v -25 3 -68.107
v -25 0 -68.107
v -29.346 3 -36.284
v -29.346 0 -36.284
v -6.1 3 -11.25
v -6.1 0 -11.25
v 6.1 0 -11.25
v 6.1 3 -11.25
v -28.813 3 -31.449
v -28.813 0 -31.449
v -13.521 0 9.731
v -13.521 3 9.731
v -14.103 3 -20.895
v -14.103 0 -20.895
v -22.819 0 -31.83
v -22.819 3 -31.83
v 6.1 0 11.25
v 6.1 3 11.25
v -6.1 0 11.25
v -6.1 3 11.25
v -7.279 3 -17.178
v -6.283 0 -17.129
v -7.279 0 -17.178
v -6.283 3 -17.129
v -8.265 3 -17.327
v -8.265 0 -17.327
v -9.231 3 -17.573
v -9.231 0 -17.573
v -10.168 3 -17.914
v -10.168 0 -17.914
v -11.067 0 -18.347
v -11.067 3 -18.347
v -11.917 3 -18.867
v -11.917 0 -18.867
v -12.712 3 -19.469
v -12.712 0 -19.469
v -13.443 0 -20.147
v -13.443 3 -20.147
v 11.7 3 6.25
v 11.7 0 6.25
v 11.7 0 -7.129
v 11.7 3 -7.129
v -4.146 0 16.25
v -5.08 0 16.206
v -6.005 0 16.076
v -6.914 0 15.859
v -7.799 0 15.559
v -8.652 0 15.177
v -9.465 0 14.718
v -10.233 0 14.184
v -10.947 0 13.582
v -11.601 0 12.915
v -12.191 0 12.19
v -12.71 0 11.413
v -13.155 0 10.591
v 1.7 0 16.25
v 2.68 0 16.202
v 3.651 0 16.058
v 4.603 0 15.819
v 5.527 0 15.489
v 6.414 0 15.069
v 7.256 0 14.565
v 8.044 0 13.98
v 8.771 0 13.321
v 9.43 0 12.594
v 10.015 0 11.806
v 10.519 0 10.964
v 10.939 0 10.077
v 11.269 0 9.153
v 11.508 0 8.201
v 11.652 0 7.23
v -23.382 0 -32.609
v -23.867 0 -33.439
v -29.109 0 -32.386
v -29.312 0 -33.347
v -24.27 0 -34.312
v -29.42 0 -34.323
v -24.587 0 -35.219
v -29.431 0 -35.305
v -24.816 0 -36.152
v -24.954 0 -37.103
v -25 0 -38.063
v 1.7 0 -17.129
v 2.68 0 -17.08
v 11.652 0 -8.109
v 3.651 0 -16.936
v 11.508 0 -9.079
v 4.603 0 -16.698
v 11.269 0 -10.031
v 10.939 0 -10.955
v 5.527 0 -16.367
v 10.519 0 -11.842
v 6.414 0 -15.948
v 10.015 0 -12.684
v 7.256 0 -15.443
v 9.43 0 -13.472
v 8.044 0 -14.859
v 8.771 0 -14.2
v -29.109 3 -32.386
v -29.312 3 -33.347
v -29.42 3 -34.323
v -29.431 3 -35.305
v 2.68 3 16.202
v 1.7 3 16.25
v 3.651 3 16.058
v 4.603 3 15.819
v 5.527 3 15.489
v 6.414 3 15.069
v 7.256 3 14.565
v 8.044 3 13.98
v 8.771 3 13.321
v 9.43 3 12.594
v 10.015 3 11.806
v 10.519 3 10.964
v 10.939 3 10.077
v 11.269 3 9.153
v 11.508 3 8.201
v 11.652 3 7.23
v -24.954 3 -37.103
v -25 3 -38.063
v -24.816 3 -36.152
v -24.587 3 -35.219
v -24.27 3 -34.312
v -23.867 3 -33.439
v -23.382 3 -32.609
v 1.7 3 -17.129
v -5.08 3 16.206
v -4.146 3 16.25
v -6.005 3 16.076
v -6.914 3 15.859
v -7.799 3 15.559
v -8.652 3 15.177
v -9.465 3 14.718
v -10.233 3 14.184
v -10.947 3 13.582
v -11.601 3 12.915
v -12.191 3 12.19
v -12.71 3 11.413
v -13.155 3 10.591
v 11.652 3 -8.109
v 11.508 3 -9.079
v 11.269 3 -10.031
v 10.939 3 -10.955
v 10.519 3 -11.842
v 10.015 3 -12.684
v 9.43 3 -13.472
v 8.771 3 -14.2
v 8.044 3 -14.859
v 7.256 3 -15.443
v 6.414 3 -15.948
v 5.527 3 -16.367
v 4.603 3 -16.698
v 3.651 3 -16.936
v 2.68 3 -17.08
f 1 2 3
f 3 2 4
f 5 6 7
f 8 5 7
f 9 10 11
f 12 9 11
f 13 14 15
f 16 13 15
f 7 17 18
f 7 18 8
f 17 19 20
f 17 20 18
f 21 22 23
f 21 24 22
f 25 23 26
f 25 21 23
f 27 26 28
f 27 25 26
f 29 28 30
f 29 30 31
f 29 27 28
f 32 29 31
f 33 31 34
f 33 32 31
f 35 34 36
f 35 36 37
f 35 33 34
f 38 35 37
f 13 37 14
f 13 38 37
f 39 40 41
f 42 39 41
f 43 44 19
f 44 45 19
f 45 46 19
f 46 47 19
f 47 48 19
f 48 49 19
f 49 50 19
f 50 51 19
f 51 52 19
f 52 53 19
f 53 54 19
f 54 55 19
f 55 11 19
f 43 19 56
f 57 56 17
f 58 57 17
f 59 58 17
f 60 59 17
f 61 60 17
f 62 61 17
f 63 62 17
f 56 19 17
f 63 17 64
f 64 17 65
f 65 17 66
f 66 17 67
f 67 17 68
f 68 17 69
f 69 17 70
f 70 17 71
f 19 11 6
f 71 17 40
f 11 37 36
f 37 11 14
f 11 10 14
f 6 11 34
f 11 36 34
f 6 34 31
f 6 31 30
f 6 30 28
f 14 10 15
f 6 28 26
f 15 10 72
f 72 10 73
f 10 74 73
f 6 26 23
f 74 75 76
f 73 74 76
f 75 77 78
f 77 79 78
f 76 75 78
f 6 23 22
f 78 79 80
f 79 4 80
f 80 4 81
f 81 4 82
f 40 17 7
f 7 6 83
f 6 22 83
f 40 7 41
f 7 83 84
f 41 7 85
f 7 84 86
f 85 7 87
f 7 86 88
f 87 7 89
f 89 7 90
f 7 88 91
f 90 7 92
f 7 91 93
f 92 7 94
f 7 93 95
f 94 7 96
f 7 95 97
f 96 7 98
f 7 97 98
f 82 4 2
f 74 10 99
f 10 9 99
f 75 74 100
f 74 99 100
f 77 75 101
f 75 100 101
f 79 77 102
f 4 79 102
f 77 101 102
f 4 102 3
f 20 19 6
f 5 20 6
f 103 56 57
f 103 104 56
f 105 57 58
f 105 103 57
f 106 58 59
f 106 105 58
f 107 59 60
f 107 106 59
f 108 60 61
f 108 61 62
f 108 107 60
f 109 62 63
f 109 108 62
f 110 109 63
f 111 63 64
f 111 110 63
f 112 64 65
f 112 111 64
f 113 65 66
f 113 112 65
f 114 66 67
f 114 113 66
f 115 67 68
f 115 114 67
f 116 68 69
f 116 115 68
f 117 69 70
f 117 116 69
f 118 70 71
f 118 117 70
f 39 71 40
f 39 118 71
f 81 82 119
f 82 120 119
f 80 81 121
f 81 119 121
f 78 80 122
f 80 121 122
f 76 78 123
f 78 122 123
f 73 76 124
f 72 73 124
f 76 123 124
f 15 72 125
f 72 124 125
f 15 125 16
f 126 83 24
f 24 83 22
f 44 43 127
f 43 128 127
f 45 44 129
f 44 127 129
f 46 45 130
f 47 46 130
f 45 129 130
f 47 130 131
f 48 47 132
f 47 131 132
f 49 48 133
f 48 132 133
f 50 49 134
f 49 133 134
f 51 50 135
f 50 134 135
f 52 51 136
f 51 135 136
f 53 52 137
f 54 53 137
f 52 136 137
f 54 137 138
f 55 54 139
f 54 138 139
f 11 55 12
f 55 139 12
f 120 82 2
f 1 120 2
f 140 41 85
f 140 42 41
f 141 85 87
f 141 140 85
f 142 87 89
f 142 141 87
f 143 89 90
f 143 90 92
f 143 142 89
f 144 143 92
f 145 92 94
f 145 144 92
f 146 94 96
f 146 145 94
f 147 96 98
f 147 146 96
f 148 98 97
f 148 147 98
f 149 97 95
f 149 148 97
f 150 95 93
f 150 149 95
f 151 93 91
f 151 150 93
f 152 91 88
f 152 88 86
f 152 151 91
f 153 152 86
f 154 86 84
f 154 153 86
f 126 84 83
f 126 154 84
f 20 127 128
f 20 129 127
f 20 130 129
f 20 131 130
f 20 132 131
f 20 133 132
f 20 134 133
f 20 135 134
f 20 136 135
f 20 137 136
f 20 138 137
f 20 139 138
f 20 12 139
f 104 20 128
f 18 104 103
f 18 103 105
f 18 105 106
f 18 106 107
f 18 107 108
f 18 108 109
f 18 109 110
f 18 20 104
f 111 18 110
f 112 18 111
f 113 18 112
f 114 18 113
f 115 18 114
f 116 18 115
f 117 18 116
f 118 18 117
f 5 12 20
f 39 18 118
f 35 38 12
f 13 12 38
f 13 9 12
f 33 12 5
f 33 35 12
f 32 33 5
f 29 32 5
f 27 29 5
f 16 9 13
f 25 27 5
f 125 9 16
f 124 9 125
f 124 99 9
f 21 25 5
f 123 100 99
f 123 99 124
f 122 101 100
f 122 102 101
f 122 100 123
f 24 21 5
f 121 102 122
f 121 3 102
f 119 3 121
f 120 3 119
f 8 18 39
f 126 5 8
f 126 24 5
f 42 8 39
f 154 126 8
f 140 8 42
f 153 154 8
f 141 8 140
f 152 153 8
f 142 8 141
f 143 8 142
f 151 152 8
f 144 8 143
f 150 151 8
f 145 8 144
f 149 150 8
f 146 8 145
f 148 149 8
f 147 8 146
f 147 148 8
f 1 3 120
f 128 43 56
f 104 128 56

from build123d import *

# Parameters (mm, degrees)
SKETCH1_W           = 12.2
SKETCH1_H           = 22.5
BOSS_EXTRUDE1_DEPTH = 3
FILLET2_R           = 10


with BuildPart() as part:
    # Sketch1 → Boss-Extrude1 (new body)
    with BuildSketch(Plane(origin=(0, 0, 0), x_dir=(1, 0, 0), z_dir=(0, 1, 0))):
        Polygon((-11.1, -16.25), (11.7, -16.25), (11.7, 17.128517662), (-11.1, 17.128517662), (-25, 34.565348469), (-25, 68.106999691), (-29.68539708, 33.799719695), align=None)
        Rectangle(SKETCH1_W, SKETCH1_H, mode=Mode.SUBTRACT)
    extrude(amount=BOSS_EXTRUDE1_DEPTH)

    # Fillet2
    fillet2_edges = [part.edges().sort_by_distance(p)[0] for p in [
        (11.7, 1.5, 16.25),
        (-11.1, 1.5, 16.25),
        (-29.68539708, 1.5, -33.799719695),
        (-25, 1.5, -34.565348469),
        (-11.1, 1.5, -17.128517662),
        (11.7, 1.5, -17.128517662),
    ]]
    fillet(fillet2_edges, radius=FILLET2_R)


solid = part.part
